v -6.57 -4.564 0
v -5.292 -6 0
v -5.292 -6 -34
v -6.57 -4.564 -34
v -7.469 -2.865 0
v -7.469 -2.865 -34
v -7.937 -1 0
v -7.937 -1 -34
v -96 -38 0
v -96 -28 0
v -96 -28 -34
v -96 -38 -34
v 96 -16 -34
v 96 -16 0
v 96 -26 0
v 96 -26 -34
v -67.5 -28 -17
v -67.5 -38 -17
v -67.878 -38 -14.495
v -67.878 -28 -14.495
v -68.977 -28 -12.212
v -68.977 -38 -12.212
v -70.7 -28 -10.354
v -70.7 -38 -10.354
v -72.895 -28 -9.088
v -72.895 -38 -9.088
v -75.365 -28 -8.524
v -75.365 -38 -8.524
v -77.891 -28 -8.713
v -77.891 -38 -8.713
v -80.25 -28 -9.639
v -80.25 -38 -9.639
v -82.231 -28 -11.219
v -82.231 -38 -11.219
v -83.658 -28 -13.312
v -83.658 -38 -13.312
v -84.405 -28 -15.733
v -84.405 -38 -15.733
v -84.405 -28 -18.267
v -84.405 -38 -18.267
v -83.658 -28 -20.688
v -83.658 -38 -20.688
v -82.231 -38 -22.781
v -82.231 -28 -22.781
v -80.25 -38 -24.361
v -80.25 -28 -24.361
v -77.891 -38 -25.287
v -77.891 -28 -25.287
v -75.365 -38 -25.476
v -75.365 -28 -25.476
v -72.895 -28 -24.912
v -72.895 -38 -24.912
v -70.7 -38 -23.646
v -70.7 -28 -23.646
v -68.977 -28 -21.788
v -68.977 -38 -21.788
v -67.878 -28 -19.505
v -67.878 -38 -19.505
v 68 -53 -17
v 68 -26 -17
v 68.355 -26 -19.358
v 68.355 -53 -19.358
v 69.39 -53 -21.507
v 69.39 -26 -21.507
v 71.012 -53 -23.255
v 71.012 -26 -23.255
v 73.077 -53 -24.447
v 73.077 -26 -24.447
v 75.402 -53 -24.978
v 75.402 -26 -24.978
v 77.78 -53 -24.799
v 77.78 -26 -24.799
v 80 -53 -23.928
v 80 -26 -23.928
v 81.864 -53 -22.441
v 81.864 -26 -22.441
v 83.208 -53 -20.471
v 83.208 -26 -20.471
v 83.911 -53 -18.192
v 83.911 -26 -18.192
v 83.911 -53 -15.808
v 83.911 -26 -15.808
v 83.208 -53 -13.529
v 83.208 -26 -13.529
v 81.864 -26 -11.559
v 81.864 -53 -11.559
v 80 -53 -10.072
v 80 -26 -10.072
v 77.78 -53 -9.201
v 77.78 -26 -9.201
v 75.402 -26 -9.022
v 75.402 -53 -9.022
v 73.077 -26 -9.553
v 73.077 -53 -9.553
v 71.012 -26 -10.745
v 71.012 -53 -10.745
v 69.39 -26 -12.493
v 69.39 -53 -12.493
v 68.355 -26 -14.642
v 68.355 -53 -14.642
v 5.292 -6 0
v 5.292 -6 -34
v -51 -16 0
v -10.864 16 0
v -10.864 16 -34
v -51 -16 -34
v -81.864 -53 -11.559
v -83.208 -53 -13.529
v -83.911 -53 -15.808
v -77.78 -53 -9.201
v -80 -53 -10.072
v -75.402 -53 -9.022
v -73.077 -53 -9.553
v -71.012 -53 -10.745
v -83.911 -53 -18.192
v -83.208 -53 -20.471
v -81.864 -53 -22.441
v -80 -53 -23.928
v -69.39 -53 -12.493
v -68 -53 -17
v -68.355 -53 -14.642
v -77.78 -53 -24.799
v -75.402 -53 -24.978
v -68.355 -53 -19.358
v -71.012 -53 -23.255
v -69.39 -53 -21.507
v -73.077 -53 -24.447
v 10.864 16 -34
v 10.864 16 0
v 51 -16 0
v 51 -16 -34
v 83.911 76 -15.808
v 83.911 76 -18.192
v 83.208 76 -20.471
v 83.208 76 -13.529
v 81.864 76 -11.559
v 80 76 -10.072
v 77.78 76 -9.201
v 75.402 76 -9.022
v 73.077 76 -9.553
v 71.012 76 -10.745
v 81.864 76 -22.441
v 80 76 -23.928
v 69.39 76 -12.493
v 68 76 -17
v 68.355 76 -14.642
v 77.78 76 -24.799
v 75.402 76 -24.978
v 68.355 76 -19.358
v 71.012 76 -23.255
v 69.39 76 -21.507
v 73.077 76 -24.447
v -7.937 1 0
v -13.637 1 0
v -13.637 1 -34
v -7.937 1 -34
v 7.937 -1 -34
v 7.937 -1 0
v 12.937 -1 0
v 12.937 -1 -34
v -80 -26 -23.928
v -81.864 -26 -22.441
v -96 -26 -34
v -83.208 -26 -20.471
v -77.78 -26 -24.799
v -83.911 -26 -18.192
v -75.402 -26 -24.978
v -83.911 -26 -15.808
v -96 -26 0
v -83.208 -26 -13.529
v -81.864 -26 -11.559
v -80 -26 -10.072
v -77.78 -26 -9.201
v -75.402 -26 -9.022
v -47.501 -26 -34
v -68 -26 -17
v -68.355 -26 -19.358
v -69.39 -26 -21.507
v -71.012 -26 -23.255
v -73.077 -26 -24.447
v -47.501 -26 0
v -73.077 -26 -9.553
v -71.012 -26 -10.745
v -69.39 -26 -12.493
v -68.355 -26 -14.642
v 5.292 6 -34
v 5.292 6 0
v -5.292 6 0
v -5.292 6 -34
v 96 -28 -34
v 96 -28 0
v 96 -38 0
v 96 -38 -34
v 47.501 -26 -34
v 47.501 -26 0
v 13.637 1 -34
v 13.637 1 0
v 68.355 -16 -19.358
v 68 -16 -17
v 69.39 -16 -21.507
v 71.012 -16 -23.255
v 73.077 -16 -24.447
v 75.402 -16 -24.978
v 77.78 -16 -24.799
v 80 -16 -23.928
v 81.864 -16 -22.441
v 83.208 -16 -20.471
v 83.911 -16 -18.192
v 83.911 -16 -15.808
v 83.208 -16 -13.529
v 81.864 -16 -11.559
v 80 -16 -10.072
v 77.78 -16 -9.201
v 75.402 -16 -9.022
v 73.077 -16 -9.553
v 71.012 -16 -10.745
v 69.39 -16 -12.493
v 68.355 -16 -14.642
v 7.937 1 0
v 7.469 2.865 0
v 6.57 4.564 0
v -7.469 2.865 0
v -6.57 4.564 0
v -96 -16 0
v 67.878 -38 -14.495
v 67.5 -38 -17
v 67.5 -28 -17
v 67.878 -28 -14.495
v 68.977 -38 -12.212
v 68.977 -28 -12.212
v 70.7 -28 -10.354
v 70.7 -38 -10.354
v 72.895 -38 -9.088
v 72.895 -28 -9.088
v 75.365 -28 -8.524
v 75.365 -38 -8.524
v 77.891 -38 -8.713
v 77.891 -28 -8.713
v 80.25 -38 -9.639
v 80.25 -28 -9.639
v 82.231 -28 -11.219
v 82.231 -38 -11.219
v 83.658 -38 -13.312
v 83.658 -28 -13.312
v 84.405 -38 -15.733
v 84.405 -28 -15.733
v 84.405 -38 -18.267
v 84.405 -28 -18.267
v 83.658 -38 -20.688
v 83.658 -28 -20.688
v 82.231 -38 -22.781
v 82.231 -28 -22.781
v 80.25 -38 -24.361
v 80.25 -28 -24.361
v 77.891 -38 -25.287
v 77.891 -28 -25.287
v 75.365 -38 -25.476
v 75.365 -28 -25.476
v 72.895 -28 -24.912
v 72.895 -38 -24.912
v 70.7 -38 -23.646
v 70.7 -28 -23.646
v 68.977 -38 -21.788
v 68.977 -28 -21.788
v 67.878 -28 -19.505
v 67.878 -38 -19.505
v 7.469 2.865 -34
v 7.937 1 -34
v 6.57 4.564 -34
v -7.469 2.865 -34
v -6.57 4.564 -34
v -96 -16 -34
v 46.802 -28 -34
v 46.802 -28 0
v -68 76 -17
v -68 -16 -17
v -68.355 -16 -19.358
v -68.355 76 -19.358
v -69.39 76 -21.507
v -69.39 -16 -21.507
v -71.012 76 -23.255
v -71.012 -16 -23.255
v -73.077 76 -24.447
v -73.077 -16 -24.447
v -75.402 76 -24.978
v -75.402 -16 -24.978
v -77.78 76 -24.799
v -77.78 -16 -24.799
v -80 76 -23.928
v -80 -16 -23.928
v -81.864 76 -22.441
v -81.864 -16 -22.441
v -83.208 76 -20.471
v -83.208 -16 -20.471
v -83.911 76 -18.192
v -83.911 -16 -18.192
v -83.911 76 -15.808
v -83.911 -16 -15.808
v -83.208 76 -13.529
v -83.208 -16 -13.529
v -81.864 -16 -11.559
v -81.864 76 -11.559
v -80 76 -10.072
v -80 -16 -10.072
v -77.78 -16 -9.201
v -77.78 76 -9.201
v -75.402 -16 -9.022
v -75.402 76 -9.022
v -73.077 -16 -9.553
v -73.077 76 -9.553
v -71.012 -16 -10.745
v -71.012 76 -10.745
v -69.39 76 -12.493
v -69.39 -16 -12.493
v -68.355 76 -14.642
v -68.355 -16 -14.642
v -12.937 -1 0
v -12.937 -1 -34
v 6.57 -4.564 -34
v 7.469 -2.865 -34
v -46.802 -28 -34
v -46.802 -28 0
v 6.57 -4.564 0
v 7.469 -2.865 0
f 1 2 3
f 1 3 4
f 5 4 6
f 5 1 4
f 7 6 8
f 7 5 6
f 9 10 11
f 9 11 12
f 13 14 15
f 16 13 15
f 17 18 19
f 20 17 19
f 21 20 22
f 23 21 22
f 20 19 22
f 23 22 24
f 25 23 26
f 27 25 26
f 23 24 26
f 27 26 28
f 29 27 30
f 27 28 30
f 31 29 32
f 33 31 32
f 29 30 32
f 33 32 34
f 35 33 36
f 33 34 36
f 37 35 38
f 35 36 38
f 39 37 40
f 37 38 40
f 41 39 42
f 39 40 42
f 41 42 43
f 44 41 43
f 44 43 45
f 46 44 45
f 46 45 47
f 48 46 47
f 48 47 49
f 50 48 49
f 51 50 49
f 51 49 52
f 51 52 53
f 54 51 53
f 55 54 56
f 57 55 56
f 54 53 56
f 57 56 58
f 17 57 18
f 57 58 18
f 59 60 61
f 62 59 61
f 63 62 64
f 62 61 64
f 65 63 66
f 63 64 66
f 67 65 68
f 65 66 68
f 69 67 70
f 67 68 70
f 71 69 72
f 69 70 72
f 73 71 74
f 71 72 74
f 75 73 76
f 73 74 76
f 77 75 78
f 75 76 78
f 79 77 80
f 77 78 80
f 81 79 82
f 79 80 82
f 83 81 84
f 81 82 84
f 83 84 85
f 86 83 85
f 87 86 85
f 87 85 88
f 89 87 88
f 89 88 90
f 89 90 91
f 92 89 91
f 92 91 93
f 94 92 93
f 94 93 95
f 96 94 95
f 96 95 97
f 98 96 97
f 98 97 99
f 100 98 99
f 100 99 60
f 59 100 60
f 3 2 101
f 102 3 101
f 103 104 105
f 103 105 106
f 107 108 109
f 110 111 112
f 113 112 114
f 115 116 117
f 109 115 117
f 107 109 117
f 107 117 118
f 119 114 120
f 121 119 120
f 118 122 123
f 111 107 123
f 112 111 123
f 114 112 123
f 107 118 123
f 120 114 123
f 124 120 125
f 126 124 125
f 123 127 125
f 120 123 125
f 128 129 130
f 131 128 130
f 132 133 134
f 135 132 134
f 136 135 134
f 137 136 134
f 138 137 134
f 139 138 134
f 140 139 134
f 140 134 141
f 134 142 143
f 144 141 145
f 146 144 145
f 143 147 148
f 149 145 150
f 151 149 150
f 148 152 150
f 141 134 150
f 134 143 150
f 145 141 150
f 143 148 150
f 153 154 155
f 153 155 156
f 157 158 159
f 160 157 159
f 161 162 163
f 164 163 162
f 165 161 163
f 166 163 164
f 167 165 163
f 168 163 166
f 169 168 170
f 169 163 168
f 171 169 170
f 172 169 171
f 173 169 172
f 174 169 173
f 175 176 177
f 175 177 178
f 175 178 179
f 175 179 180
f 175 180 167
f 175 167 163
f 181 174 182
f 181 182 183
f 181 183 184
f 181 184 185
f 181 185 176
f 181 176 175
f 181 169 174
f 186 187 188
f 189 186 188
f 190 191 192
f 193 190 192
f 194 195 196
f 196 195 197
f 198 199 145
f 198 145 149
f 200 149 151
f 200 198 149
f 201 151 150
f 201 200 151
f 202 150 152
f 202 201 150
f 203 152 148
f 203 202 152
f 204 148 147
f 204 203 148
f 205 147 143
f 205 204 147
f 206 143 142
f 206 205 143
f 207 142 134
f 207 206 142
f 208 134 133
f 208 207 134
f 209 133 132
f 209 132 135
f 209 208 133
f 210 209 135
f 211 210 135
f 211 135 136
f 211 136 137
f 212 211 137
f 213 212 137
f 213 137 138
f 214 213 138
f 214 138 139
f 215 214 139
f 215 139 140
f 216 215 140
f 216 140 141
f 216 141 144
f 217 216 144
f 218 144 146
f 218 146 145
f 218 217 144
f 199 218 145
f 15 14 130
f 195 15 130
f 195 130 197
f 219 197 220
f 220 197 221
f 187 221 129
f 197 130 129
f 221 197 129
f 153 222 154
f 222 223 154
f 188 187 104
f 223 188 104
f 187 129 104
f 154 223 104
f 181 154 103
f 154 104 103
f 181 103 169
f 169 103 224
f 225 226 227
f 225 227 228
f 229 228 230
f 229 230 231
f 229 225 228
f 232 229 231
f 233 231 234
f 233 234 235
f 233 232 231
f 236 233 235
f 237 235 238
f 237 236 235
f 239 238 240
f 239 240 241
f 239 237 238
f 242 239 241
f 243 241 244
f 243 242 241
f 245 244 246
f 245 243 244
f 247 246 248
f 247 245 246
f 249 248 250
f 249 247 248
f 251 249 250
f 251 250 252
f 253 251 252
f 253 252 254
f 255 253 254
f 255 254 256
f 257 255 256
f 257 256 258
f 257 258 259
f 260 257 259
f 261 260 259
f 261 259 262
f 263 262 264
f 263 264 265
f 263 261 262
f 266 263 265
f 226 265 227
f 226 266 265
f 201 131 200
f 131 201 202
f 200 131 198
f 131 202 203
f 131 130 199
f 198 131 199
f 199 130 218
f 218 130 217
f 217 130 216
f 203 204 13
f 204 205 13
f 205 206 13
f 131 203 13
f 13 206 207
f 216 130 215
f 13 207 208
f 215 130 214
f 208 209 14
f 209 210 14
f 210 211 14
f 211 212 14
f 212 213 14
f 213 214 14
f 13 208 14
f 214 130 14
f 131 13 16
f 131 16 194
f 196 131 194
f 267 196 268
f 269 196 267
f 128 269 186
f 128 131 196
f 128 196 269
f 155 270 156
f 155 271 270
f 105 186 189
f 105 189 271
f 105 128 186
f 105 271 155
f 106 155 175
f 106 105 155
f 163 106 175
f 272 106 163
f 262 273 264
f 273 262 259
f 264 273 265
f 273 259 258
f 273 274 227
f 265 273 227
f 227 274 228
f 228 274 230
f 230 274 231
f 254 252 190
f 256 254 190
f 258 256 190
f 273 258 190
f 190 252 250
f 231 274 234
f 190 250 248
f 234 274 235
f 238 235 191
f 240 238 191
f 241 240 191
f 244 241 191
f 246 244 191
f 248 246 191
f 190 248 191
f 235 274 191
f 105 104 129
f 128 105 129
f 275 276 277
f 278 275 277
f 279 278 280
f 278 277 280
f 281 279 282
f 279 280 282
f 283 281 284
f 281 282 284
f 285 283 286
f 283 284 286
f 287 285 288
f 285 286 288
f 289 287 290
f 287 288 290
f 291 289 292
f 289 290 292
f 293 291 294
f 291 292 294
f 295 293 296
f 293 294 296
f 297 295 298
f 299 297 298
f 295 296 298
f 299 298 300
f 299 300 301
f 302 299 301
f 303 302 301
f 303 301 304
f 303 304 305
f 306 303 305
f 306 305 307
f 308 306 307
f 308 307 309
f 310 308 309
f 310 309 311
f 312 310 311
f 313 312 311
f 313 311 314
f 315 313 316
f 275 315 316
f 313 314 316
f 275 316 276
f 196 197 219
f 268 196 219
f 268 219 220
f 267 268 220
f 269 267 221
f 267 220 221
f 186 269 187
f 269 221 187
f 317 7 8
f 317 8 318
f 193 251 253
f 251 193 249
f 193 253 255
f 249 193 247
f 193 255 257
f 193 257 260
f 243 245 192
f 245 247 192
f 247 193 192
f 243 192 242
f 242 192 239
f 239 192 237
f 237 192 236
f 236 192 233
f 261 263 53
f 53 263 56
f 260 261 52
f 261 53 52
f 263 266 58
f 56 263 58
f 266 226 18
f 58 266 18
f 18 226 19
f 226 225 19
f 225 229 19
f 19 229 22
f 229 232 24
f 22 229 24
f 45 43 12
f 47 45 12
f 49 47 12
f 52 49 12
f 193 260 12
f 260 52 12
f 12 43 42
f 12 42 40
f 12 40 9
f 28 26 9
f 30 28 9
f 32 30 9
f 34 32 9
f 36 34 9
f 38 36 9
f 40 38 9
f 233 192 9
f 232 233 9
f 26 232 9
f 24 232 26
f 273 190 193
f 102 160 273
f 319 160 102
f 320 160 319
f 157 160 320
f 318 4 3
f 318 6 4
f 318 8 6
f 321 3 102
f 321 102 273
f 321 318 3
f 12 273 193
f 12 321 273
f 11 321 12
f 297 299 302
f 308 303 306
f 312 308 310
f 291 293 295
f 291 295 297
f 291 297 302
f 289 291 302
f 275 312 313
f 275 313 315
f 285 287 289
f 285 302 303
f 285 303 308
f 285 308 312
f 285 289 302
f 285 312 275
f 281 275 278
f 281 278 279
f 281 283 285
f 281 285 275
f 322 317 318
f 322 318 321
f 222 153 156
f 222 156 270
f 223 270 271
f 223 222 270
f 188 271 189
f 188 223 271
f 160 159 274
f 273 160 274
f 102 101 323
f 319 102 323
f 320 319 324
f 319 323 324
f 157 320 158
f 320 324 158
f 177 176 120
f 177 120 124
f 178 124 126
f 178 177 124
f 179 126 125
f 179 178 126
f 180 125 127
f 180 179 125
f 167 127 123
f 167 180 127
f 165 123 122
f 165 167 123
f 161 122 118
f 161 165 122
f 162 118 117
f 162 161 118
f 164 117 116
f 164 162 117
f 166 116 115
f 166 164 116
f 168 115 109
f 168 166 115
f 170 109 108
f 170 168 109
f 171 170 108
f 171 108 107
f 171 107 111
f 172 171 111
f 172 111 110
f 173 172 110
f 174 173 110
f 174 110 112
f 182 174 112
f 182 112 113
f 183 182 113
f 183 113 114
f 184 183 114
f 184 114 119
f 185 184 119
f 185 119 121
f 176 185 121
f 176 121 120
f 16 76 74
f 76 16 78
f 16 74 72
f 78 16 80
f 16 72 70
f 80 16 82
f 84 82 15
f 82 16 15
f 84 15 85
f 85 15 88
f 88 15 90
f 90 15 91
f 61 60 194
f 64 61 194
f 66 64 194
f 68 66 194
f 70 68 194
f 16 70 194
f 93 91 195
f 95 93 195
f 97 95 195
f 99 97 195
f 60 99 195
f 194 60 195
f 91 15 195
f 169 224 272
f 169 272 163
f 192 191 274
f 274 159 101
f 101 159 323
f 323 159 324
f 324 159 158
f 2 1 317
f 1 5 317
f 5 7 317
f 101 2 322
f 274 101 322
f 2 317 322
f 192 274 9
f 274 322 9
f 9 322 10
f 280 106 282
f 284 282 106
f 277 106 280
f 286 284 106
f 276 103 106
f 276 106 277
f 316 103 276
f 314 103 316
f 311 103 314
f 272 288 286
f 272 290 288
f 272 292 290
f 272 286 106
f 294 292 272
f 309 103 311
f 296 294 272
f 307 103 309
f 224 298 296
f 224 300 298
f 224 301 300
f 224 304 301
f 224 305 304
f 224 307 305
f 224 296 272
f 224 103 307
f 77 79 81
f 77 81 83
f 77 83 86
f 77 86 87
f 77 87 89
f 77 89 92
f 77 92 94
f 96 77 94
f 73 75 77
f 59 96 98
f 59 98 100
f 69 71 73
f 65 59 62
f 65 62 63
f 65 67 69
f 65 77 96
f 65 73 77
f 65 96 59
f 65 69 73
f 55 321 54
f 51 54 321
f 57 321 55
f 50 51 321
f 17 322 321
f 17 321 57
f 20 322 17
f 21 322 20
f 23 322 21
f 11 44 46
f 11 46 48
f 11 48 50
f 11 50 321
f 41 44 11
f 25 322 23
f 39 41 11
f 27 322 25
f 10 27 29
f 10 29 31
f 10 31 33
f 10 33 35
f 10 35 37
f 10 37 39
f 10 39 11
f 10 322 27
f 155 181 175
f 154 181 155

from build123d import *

# Parameters (mm, degrees)
EXTRUDE_1_DEPTH      = 34
EXTRUDE_1_2_DEPTH    = 34
SKETCH_3_R           = 8
EXTRUDE_2_DEPTH      = 92
EXTRUDE_2_DEPTH_BACK = 37
SKETCH_4_R           = 8.5
CUT_EXTRUDE_1_DEPTH  = 10


with BuildPart() as part:
    # Эскиз2 → Бобышка-Вытянуть1 (new body)
    with BuildSketch(Plane.XY):
        with BuildLine():
            Line((-5.291502622, 6), (0, 6))
            Line((0, 6), (0, 16))
            Line((0, 16), (-10.864298335, 16))
            Line((-10.864298335, 16), (-51, -16))
            Line((-51, -16), (-96, -16))
            Line((-96, -16), (-96, -26))
            Line((-96, -26), (-47.501460178, -26))
            Line((-47.501460178, -26), (-13.636961898, 1))
            Line((-13.636961898, 1), (-7.937253933, 1))
            ThreePointArc((-7.937253933, 1), (-7.071067812, 3.741657387), (-5.291502622, 6))
        make_face()
    extrude(amount=-EXTRUDE_1_DEPTH)

    # Эскиз3 → Бобышка-Вытянуть2 (add, two sides)
    with BuildSketch(Plane(origin=(0, -16, 0), x_dir=(1, 0, 0), z_dir=(0, 1, 0))) as extrude_2_sk:
        with Locations((-76, 17)):
            Circle(SKETCH_3_R)
    extrude(amount=EXTRUDE_2_DEPTH)
    extrude(extrude_2_sk.sketch, amount=-EXTRUDE_2_DEPTH_BACK)

    # Mirror 1 2: part across plane


with BuildPart() as body_2:
    # Эскиз2 → Extrude 1 2 (new body)
    with BuildSketch(Plane.XY):
        with BuildLine():
            Line((0, -6), (-5.291502622, -6))
            ThreePointArc((-5.291502622, -6), (-7.071067812, -3.741657387), (-7.937253933, -1))
            Line((-7.937253933, -1), (-12.937253933, -1))
            Line((-12.937253933, -1), (-46.801752213, -28))
            Line((-46.801752213, -28), (-96, -28))
            Line((-96, -28), (-96, -38))
            Line((-96, -38), (0, -38))
            Line((0, -38), (0, -6))
        make_face()
    extrude(amount=-EXTRUDE_1_2_DEPTH)

    # Эскиз4 → Вырез-Вытянуть1 (cut)
    with BuildSketch(Plane.XZ.offset(38)):
        with Locations((-76, -17)):
            Circle(SKETCH_4_R)
    extrude(amount=-CUT_EXTRUDE_1_DEPTH, mode=Mode.SUBTRACT)

    # Зеркальное отражение1: body 2 across plane


with BuildPart() as body_2_1:
    add(body_2.part)
    add(body_2.part.mirror(Plane(origin=(0, -6, -138.785495179), x_dir=(0, 0, 1), z_dir=(1, 0, 0))))


with BuildPart() as part_1:
    add(part.part)
    add(part.part.mirror(Plane(origin=(0, -6, -138.785495179), x_dir=(0, 0, 1), z_dir=(1, 0, 0))))


solid = Compound([body_2_1.part, part_1.part])
